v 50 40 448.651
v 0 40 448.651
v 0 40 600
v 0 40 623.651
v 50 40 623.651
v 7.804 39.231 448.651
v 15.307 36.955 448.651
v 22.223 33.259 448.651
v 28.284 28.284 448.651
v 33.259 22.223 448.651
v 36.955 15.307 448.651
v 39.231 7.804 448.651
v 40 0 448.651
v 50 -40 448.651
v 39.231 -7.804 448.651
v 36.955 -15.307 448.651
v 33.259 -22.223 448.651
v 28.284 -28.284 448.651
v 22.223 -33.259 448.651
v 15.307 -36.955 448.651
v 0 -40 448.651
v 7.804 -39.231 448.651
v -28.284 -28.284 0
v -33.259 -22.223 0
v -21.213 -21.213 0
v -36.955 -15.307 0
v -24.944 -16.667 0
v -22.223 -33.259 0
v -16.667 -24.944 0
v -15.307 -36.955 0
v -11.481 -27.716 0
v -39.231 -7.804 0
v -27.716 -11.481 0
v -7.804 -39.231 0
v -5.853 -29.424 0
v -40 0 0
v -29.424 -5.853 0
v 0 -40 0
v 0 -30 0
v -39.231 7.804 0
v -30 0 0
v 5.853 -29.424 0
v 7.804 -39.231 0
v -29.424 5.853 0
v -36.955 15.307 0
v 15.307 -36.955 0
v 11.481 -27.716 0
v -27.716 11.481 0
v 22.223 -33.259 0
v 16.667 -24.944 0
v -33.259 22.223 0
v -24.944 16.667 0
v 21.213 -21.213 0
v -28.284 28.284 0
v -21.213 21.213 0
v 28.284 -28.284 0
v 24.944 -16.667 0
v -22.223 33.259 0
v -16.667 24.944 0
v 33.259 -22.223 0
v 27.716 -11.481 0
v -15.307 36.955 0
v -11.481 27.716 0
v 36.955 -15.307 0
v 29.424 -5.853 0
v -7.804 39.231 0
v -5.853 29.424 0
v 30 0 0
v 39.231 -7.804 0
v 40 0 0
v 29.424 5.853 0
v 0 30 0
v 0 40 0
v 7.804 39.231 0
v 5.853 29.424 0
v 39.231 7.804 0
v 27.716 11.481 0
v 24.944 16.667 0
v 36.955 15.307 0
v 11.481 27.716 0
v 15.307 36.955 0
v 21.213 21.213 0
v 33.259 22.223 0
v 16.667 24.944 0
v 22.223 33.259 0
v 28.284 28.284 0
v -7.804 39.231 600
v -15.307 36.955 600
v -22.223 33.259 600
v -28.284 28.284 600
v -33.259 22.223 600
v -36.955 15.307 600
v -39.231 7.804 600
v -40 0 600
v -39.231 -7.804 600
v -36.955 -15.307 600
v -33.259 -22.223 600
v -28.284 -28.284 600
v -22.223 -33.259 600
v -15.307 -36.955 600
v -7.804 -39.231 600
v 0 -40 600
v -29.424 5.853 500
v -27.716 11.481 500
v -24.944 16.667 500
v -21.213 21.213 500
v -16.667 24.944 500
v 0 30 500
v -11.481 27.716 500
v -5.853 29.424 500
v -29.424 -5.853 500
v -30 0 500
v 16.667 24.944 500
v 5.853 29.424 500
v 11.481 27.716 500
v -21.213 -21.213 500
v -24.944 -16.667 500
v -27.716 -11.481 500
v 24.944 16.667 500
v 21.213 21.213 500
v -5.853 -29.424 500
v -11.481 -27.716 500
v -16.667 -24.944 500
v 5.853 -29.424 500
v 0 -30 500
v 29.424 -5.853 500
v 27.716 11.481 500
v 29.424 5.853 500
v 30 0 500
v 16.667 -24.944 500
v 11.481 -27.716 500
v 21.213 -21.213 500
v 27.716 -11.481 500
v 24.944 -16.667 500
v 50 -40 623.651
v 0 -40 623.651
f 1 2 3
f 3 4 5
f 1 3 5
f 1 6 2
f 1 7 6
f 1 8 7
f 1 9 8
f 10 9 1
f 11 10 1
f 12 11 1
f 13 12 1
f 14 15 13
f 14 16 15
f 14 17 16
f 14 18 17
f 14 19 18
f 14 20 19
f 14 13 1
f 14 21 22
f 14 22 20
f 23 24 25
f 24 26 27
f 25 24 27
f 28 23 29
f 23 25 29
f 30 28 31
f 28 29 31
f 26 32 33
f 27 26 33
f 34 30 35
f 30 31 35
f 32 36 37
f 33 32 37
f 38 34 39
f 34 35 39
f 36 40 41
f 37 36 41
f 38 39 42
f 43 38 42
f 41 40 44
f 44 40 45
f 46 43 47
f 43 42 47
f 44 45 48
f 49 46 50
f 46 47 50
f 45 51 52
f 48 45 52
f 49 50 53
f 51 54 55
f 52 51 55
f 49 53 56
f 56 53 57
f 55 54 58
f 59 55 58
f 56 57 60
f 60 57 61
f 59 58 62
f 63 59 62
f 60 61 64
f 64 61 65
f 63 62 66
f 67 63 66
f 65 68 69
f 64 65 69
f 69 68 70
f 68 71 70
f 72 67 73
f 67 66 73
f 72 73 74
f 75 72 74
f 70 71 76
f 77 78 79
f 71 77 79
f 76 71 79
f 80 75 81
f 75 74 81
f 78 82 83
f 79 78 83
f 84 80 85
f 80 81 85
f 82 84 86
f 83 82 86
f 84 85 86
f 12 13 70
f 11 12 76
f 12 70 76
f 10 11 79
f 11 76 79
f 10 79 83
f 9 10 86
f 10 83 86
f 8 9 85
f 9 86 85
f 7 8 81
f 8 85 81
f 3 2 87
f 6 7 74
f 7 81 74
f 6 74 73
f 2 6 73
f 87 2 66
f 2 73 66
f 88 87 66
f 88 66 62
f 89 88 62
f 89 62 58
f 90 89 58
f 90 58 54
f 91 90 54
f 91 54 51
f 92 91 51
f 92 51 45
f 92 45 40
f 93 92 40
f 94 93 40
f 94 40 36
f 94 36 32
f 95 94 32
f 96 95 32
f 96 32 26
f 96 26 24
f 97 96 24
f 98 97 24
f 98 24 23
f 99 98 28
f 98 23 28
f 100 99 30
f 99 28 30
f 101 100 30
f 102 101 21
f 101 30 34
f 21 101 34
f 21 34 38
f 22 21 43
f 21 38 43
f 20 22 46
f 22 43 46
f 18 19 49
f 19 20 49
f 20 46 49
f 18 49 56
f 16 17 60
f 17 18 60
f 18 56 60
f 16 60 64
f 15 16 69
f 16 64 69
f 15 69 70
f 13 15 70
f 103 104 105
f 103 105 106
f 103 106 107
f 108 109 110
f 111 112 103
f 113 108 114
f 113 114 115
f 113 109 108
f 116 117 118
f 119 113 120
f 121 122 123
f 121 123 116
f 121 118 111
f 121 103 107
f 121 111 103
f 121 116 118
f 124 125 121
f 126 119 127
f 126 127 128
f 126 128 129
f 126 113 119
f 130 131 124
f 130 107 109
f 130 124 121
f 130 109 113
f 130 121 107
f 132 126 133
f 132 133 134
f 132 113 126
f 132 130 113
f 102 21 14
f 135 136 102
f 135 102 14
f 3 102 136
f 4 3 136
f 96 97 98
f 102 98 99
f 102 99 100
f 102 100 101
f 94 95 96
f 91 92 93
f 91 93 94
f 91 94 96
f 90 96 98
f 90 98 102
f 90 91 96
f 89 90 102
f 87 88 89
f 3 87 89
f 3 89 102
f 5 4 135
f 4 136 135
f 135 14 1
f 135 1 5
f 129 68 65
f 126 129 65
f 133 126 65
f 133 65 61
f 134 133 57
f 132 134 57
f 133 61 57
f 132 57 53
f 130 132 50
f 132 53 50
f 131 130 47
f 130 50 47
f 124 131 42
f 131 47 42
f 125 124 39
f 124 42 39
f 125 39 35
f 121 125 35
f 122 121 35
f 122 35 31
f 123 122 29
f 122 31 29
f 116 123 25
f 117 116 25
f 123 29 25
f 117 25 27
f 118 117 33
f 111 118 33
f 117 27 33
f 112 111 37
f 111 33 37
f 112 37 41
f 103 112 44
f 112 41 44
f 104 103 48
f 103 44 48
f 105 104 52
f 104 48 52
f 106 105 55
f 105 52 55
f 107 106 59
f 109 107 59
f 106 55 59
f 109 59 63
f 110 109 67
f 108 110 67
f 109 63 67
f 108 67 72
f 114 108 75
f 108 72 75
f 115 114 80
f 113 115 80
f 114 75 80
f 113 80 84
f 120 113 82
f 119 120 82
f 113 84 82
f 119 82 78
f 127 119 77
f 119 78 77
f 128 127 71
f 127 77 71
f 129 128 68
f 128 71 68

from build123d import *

# Parameters (mm, degrees)
F0_R     = 40
F1_DEPTH = 600
F2_W     = 50
F2_H     = 175
F3_DEPTH = 40
F4_R     = 30
F5_DEPTH = 500


with BuildPart() as f1:
    # F0 (on Top) → F1 (new body)
    with BuildSketch(Plane.XY):
        Circle(F0_R)
    extrude(amount=F1_DEPTH)

    # F2 (on Front) → F3 (join, symmetric)
    with BuildSketch(Plane.XZ):
        with Locations((25, 536.151046)):
            Rectangle(F2_W, F2_H)
    extrude(amount=F3_DEPTH, both=True)

    # F4 (on face) → F5 (cut)
    with BuildSketch(Plane(origin=(0, 0, 0), x_dir=(1, 0, 0), z_dir=(0, 0, -1))):
        Circle(F4_R)
    extrude(amount=-F5_DEPTH, mode=Mode.SUBTRACT)


solid = f1.part
